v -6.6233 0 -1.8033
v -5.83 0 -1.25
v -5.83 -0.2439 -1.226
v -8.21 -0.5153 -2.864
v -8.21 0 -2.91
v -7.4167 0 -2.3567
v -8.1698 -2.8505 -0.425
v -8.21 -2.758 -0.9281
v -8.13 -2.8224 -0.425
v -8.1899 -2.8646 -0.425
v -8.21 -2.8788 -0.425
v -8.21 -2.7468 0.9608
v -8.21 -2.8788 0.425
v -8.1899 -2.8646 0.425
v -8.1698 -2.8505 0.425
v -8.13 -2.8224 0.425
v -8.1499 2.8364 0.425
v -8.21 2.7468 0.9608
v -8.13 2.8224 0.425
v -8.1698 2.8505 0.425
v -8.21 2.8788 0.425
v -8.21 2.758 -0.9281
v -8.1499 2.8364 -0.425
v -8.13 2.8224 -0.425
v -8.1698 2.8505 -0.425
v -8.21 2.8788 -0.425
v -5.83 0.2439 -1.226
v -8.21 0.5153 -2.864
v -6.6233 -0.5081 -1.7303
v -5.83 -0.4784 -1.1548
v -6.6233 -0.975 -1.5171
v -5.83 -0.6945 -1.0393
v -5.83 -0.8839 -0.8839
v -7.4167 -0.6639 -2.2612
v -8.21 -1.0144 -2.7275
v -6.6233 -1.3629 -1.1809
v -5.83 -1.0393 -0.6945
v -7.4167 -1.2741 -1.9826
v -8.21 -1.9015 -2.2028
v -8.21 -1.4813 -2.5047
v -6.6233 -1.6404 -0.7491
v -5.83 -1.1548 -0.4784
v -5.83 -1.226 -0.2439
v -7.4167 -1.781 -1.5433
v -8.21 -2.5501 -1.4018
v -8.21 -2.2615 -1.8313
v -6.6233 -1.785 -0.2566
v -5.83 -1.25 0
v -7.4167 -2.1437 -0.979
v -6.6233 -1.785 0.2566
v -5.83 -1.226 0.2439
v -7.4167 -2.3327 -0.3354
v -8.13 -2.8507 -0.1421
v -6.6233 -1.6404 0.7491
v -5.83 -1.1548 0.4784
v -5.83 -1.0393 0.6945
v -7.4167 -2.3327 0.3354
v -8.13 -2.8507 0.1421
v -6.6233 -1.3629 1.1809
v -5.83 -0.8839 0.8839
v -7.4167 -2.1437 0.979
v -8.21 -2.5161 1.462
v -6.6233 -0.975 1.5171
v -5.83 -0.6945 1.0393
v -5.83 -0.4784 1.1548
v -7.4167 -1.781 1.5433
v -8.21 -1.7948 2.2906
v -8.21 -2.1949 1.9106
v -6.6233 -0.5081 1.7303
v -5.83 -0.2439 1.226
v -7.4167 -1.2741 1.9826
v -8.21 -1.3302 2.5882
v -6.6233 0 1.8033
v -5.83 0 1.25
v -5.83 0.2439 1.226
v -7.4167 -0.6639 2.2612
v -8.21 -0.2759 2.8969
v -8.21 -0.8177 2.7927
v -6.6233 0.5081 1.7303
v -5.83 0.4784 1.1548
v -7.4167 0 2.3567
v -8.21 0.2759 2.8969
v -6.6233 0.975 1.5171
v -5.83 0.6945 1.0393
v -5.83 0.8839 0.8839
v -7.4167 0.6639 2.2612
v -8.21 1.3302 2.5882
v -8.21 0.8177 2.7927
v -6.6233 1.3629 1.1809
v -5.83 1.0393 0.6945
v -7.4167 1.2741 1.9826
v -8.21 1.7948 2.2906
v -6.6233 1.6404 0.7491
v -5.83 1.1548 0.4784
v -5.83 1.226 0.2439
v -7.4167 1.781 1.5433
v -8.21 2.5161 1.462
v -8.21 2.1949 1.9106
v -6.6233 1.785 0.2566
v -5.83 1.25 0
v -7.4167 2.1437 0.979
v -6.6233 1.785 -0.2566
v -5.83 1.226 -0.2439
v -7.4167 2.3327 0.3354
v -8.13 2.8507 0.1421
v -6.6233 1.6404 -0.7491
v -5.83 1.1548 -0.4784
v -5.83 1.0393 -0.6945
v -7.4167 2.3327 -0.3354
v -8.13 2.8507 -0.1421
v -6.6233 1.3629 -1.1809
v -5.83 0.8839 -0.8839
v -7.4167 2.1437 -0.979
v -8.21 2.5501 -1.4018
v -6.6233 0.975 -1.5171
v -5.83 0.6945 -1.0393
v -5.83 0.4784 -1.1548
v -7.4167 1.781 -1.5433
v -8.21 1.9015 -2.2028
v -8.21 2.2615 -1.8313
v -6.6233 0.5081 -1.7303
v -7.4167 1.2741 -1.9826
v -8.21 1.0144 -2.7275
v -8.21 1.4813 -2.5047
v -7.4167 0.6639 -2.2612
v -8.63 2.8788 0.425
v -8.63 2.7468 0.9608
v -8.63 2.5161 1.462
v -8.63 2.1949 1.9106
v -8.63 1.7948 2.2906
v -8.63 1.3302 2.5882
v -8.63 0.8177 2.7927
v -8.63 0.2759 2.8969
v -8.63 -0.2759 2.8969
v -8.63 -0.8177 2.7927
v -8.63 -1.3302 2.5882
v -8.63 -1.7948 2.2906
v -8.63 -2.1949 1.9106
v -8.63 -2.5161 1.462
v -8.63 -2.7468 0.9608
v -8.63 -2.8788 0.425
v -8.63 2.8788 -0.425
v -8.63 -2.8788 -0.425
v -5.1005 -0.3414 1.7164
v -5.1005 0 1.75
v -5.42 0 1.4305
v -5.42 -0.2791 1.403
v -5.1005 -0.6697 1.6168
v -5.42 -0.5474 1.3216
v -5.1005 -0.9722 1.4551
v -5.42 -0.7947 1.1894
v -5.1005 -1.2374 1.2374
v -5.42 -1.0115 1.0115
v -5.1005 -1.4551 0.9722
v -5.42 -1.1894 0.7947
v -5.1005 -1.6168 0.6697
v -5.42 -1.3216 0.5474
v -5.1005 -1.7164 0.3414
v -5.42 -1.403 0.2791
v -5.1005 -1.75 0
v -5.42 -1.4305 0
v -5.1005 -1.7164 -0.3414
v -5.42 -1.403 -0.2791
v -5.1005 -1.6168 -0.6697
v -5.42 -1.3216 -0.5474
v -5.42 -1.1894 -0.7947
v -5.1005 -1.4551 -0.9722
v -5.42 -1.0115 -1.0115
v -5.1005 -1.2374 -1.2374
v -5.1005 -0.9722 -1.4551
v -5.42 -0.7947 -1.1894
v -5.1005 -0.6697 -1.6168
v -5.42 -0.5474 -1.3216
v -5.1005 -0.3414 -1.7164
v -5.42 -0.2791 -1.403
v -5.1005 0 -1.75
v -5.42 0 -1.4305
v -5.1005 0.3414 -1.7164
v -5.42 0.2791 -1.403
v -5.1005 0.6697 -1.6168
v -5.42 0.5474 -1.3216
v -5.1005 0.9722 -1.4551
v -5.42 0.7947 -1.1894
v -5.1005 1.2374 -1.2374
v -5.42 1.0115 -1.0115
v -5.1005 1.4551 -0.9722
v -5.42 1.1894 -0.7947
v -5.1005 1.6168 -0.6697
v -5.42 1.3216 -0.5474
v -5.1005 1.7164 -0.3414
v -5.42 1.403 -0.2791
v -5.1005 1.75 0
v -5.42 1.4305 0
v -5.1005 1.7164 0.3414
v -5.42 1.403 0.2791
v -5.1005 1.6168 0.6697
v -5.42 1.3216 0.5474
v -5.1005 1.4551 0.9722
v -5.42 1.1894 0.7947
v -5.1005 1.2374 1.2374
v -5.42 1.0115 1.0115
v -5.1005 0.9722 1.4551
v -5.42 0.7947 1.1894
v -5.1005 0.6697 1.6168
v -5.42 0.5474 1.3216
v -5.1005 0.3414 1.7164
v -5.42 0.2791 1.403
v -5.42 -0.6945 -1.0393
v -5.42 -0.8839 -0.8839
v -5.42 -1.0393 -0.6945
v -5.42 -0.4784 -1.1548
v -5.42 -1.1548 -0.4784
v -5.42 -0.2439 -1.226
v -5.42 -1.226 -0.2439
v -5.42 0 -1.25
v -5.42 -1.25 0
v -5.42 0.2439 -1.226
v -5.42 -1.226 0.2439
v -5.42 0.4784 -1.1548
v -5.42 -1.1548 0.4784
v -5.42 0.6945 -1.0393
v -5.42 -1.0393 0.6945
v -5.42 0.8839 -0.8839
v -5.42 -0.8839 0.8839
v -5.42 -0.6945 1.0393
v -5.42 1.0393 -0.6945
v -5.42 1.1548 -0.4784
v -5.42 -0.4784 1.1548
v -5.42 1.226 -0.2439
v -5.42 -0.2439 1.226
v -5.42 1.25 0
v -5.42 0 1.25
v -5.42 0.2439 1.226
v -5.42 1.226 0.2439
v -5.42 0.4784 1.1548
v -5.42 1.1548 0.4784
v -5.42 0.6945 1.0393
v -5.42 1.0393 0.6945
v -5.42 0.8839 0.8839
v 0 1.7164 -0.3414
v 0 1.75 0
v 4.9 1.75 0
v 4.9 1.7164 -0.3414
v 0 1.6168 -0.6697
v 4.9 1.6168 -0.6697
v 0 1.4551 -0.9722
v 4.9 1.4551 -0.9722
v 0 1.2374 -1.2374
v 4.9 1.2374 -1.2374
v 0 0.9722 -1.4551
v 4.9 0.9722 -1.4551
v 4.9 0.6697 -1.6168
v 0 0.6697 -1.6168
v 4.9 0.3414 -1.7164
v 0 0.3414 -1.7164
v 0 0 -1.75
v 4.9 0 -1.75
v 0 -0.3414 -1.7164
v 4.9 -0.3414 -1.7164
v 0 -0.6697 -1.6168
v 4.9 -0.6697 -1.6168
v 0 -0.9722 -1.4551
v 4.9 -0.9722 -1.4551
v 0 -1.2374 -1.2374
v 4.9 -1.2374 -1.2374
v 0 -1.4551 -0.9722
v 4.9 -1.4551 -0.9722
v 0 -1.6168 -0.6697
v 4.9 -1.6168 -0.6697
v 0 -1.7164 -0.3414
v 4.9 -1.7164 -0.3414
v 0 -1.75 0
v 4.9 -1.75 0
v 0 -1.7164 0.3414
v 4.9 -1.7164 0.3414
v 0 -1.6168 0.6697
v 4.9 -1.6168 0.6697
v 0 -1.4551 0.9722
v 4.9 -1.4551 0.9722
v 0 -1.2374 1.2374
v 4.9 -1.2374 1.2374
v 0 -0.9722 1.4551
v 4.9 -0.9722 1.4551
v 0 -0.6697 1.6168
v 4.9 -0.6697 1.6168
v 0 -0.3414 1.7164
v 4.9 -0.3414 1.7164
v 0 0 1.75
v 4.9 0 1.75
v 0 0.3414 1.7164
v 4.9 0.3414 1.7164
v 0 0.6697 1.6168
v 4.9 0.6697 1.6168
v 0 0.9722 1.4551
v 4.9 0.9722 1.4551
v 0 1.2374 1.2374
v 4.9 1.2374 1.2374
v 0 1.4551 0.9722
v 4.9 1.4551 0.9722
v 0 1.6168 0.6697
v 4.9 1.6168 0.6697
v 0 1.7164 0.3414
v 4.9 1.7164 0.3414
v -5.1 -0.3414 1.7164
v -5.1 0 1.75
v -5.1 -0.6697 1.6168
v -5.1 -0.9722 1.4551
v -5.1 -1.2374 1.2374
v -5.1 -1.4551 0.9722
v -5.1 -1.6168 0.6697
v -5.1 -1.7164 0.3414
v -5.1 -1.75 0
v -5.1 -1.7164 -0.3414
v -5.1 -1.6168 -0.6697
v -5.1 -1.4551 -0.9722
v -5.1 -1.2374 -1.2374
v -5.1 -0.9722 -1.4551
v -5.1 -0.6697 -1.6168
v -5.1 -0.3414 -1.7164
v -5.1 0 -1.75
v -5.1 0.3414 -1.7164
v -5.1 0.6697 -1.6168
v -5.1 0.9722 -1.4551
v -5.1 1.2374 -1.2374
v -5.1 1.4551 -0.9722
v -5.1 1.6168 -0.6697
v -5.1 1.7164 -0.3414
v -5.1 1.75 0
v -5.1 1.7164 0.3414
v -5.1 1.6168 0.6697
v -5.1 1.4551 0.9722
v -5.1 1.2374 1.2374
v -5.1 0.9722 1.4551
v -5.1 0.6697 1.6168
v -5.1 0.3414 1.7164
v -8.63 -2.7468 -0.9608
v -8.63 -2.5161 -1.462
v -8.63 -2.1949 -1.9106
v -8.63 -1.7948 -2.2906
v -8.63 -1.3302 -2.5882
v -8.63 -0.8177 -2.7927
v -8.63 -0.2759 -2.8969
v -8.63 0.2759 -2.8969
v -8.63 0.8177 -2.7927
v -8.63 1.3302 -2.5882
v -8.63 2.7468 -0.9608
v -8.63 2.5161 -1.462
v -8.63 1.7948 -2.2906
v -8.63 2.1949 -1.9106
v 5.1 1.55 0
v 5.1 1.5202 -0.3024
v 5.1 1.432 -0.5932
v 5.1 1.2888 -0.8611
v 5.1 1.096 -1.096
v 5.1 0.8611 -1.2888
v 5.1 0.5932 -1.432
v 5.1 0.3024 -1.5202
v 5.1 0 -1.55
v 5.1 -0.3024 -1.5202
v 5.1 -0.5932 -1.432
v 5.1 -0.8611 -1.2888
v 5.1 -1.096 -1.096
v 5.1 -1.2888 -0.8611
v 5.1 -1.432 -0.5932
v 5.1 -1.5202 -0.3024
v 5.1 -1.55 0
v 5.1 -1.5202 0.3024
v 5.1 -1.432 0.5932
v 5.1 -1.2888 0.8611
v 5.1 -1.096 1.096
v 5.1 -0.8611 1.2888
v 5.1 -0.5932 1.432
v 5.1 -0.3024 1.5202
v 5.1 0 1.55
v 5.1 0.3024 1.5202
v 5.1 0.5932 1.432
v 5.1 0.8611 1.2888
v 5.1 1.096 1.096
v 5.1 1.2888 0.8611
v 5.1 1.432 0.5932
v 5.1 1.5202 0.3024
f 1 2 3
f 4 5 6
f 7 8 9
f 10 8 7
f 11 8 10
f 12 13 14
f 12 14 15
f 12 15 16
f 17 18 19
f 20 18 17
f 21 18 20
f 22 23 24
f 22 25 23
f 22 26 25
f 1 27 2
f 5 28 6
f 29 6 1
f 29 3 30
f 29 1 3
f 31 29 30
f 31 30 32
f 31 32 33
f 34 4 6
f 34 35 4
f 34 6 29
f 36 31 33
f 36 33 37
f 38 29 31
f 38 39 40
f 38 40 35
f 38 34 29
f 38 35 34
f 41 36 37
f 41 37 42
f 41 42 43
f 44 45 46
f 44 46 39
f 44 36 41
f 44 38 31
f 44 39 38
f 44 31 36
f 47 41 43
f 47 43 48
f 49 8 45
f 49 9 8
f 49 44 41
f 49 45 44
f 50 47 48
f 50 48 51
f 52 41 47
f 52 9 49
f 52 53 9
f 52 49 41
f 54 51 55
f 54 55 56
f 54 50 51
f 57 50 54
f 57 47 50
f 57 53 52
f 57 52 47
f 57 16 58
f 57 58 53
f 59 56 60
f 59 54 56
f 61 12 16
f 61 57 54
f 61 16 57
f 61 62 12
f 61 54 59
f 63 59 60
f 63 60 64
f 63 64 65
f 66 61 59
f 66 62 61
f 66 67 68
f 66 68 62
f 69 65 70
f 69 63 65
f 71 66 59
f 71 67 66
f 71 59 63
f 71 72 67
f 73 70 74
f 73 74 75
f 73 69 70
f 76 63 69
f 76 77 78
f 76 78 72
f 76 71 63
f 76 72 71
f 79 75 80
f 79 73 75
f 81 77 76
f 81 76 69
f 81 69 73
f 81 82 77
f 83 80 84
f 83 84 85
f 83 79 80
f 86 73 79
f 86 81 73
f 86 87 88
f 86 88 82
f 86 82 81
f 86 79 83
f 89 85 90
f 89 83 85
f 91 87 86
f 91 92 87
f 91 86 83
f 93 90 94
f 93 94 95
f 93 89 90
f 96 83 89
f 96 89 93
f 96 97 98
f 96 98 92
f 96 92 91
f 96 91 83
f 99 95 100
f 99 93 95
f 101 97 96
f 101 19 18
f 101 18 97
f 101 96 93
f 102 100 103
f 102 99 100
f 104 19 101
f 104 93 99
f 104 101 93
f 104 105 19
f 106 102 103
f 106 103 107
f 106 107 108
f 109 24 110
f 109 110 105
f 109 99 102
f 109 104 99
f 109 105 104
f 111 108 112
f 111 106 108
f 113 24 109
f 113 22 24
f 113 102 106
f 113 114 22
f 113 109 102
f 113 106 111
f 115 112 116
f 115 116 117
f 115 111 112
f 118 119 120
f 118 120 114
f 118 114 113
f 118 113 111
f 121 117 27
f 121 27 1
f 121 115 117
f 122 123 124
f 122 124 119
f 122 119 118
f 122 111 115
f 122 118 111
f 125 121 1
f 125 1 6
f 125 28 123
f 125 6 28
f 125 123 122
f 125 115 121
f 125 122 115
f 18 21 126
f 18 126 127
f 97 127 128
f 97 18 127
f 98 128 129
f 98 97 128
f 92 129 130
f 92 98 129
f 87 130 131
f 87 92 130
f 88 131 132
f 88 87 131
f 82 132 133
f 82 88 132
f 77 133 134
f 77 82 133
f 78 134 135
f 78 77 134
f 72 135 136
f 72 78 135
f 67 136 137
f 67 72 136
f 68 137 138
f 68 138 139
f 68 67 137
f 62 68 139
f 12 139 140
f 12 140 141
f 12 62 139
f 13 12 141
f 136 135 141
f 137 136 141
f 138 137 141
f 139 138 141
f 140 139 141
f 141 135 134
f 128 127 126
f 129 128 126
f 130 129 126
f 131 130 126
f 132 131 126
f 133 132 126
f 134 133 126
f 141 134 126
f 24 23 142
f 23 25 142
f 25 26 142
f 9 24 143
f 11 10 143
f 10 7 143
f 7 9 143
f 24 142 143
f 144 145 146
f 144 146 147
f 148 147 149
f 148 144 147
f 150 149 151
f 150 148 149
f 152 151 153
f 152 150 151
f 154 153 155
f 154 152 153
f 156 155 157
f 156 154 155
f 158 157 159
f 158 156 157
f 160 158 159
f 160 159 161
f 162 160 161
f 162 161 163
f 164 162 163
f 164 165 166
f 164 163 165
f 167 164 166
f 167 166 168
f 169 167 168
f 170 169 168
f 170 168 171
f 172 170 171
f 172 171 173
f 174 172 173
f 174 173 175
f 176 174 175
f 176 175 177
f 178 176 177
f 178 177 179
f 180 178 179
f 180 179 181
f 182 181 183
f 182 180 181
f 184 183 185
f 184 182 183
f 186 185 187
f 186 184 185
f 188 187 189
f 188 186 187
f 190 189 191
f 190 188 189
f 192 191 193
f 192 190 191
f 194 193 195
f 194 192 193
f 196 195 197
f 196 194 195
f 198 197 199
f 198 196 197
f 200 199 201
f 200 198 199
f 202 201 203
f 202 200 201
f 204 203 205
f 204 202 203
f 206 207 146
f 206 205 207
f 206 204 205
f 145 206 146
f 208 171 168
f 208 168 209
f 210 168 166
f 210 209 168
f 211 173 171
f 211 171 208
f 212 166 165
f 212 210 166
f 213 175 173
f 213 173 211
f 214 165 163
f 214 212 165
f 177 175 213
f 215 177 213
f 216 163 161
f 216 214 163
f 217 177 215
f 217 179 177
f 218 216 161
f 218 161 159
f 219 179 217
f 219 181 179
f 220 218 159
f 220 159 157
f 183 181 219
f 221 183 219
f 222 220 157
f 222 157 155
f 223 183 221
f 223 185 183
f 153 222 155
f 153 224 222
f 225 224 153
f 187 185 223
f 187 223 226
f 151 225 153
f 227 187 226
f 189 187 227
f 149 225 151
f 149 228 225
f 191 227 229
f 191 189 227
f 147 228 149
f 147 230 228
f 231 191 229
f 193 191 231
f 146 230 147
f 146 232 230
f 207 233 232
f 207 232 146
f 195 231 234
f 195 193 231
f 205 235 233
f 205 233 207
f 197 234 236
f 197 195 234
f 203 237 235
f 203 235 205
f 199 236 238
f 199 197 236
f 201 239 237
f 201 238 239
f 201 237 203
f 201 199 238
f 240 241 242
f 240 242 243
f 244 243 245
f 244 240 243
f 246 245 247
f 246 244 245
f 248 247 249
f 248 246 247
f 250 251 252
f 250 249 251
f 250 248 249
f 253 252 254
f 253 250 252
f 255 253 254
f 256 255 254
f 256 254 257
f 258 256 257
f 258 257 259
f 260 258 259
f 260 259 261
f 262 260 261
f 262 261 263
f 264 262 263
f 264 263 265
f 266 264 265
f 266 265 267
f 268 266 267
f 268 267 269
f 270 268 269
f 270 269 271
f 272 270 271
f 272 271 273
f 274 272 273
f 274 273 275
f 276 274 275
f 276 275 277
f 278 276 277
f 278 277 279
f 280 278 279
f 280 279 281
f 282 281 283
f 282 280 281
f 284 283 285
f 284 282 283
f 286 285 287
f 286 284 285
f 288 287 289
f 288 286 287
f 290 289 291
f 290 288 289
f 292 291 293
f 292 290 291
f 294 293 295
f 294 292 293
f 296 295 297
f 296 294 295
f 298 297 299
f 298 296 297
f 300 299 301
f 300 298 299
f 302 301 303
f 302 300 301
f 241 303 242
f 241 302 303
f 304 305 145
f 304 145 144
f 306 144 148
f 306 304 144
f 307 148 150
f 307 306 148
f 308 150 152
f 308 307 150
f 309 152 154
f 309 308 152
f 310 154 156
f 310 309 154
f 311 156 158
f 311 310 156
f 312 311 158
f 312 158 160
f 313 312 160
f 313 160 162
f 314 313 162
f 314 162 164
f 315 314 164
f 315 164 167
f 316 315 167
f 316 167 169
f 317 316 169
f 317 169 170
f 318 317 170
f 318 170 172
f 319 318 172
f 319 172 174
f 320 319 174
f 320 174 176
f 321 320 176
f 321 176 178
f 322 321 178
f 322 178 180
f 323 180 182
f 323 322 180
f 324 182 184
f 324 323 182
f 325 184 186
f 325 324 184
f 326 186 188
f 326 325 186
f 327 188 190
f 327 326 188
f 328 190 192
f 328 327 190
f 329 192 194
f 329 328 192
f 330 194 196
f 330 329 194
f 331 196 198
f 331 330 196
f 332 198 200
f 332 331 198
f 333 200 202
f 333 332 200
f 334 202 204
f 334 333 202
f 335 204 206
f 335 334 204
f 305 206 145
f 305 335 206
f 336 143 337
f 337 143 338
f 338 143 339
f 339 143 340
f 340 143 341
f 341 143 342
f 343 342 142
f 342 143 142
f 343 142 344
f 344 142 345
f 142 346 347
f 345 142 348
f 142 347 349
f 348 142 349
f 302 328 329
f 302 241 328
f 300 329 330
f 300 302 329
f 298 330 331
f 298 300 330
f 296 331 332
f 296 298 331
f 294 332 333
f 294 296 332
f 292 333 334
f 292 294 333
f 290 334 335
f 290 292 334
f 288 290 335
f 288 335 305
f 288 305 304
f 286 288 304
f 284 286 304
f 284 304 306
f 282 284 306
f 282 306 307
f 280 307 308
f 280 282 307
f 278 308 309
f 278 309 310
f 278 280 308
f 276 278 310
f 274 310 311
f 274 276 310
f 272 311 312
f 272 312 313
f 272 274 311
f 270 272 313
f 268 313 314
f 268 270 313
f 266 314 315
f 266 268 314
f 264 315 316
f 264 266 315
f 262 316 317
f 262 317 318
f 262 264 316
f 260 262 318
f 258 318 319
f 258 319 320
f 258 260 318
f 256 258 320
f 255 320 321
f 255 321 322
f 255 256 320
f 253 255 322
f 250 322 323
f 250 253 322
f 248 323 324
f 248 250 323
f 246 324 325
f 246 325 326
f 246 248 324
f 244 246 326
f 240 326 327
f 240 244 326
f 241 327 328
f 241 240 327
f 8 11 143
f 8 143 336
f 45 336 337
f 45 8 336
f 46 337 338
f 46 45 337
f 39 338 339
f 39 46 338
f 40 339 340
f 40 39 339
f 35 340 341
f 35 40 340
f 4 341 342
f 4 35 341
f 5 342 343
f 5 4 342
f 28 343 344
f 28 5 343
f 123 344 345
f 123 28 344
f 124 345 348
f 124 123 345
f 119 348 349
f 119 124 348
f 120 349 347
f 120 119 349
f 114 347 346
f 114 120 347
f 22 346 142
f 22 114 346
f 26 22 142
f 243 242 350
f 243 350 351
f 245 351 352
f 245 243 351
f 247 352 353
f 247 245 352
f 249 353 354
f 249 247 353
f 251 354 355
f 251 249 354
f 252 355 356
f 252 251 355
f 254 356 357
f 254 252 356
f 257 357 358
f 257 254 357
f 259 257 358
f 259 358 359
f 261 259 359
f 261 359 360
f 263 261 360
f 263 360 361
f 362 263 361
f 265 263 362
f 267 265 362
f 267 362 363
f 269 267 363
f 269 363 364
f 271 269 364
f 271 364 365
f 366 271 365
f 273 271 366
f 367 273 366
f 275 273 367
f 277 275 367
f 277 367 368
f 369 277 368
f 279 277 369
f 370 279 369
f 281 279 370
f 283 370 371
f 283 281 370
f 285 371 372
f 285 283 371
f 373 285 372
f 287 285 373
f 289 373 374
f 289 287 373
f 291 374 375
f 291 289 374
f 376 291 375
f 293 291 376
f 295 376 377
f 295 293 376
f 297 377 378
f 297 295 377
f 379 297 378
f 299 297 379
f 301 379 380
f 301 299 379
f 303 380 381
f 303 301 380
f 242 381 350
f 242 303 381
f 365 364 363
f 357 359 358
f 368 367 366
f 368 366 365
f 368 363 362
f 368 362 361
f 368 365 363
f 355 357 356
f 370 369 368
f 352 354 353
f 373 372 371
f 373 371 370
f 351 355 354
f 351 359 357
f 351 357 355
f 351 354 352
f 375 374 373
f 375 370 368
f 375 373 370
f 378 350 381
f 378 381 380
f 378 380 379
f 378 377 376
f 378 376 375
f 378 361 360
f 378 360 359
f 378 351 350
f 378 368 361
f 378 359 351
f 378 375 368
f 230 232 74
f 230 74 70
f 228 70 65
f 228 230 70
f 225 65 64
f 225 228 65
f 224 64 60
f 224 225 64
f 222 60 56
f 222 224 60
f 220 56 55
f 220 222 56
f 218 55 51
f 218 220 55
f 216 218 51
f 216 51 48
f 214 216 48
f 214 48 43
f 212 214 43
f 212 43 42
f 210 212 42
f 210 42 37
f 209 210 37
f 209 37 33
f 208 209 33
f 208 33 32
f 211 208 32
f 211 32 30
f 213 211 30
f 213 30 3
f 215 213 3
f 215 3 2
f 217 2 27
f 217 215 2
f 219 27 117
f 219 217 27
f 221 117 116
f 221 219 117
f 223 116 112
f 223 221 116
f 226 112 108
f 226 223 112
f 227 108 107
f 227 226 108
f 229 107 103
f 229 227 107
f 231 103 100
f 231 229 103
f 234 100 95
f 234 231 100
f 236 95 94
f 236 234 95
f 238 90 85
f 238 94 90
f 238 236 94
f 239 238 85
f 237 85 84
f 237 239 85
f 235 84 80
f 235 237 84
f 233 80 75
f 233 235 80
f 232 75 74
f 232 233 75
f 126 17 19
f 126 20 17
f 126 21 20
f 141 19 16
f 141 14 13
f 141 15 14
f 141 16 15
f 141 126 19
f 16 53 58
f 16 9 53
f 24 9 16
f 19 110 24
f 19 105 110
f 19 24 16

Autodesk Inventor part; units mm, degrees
ref_plane "YZ Plane" through (0, 0, 0) normal (1, 0, 0) x (0, 1, 0)
ref_plane "XZ Plane" through (0, 0, 0) normal (0, 1, 0) x (-1, 0, 0)
ref_plane "XY Plane" through (0, 0, 0) normal (0, 0, 1) x (1, 0, 0)
sketch "Sketch2" plane through (0, 0, 0) normal (1, 0, 0) x (0, 1, 0)
  circle A0 centre (0, 0) radius 1.75
extrude "Extrusion1" add sketch "Sketch2" along normal mid plane 10.2
chamfer "Chamfer1" distance 0.2 angle 45 1 edges at (5.1, -1.75, 0) measured on face at (5.1, -0.5165, 0.5026)
sketch "Sketch3" plane through (-5.1, 0, 0) normal (-1, 0, 0) x (0, 0, 1)
  circle A0 centre (0, 0) radius 1.75
  dimension "d27" = 3.5
extrude "Extrusion2" add sketch "Sketch3" along normal blind 0.32
chamfer "Chamfer2" distance 0.32 angle 45 1 edges at (-5.42, 0, -1.75) measured on face at (-5.42, 0.5026, -0.5165)
sketch "Sketch4" plane through (-5.42, 0, 0) normal (-1, 0, 0) x (0, 0, 1)
  circle A0 centre (0, 0) radius 1.25
  dimension "d33" = 2.5
extrude "Extrusion3" add sketch "Sketch4" along normal blind 0.41
sketch "Sketch5" plane through (0, 0, 0) normal (0, 1, 0) x (-1, 0, 0)
  line L0 (5.83, 0) -> (5.83, -1.25)
  line L1 (8.63, -2.91) -> (8.21, -2.91)
  line L2 (8.21, -2.91) -> (5.83, -1.25)
  line L3 (8.63, -2.91) -> (8.63, 0)
  line L4 (5.83, -1.25) -> (5.83, 0)
  line L5 (8.63, 0) -> (5.83, 0)
  point P0 (0, 0)
  dimension "d40" = 0.42
revolve "Revolution1" add sketch "Sketch5" angle 360 about axis through (-8.63, 0, 0) along (1, 0, 0)
sketch "Sketch6" plane through (-8.63, 0, 0) normal (-1, 0, 0) x (0, 0, 1)
  circle A0 centre (0, 0) radius 2.91 projected
  line L0 (0.425, 2.91) -> (0.425, -2.91)
  line L1 (-0.425, 2.91) -> (-0.425, -2.91)
  line L2 (-0.425, 2.91) -> (0.425, 2.91)
  line L3 (-0.425, -2.91) -> (0.425, -2.91)
  line L4 (-0.425, 2.91) -> (0.425, 2.91)
  line L5 (0.425, 2.91) -> (0.425, -2.91)
  line L6 (0.425, -2.91) -> (-0.425, -2.91)
  line L7 (-0.425, -2.91) -> (-0.425, 2.91)
extrude "Extrusion4" cut sketch "Sketch6" against normal blind 0.5 contours L0 A0 L1 | A0 L2 L0 | L0 L3 A0 | A0 L1 L2 | L3 L1 A0
thread "Thread1" size "M4x0.5" class "6g" standard "ANSI Metric M Profile" full length
properties part number "parafuso escariado M3,5"
